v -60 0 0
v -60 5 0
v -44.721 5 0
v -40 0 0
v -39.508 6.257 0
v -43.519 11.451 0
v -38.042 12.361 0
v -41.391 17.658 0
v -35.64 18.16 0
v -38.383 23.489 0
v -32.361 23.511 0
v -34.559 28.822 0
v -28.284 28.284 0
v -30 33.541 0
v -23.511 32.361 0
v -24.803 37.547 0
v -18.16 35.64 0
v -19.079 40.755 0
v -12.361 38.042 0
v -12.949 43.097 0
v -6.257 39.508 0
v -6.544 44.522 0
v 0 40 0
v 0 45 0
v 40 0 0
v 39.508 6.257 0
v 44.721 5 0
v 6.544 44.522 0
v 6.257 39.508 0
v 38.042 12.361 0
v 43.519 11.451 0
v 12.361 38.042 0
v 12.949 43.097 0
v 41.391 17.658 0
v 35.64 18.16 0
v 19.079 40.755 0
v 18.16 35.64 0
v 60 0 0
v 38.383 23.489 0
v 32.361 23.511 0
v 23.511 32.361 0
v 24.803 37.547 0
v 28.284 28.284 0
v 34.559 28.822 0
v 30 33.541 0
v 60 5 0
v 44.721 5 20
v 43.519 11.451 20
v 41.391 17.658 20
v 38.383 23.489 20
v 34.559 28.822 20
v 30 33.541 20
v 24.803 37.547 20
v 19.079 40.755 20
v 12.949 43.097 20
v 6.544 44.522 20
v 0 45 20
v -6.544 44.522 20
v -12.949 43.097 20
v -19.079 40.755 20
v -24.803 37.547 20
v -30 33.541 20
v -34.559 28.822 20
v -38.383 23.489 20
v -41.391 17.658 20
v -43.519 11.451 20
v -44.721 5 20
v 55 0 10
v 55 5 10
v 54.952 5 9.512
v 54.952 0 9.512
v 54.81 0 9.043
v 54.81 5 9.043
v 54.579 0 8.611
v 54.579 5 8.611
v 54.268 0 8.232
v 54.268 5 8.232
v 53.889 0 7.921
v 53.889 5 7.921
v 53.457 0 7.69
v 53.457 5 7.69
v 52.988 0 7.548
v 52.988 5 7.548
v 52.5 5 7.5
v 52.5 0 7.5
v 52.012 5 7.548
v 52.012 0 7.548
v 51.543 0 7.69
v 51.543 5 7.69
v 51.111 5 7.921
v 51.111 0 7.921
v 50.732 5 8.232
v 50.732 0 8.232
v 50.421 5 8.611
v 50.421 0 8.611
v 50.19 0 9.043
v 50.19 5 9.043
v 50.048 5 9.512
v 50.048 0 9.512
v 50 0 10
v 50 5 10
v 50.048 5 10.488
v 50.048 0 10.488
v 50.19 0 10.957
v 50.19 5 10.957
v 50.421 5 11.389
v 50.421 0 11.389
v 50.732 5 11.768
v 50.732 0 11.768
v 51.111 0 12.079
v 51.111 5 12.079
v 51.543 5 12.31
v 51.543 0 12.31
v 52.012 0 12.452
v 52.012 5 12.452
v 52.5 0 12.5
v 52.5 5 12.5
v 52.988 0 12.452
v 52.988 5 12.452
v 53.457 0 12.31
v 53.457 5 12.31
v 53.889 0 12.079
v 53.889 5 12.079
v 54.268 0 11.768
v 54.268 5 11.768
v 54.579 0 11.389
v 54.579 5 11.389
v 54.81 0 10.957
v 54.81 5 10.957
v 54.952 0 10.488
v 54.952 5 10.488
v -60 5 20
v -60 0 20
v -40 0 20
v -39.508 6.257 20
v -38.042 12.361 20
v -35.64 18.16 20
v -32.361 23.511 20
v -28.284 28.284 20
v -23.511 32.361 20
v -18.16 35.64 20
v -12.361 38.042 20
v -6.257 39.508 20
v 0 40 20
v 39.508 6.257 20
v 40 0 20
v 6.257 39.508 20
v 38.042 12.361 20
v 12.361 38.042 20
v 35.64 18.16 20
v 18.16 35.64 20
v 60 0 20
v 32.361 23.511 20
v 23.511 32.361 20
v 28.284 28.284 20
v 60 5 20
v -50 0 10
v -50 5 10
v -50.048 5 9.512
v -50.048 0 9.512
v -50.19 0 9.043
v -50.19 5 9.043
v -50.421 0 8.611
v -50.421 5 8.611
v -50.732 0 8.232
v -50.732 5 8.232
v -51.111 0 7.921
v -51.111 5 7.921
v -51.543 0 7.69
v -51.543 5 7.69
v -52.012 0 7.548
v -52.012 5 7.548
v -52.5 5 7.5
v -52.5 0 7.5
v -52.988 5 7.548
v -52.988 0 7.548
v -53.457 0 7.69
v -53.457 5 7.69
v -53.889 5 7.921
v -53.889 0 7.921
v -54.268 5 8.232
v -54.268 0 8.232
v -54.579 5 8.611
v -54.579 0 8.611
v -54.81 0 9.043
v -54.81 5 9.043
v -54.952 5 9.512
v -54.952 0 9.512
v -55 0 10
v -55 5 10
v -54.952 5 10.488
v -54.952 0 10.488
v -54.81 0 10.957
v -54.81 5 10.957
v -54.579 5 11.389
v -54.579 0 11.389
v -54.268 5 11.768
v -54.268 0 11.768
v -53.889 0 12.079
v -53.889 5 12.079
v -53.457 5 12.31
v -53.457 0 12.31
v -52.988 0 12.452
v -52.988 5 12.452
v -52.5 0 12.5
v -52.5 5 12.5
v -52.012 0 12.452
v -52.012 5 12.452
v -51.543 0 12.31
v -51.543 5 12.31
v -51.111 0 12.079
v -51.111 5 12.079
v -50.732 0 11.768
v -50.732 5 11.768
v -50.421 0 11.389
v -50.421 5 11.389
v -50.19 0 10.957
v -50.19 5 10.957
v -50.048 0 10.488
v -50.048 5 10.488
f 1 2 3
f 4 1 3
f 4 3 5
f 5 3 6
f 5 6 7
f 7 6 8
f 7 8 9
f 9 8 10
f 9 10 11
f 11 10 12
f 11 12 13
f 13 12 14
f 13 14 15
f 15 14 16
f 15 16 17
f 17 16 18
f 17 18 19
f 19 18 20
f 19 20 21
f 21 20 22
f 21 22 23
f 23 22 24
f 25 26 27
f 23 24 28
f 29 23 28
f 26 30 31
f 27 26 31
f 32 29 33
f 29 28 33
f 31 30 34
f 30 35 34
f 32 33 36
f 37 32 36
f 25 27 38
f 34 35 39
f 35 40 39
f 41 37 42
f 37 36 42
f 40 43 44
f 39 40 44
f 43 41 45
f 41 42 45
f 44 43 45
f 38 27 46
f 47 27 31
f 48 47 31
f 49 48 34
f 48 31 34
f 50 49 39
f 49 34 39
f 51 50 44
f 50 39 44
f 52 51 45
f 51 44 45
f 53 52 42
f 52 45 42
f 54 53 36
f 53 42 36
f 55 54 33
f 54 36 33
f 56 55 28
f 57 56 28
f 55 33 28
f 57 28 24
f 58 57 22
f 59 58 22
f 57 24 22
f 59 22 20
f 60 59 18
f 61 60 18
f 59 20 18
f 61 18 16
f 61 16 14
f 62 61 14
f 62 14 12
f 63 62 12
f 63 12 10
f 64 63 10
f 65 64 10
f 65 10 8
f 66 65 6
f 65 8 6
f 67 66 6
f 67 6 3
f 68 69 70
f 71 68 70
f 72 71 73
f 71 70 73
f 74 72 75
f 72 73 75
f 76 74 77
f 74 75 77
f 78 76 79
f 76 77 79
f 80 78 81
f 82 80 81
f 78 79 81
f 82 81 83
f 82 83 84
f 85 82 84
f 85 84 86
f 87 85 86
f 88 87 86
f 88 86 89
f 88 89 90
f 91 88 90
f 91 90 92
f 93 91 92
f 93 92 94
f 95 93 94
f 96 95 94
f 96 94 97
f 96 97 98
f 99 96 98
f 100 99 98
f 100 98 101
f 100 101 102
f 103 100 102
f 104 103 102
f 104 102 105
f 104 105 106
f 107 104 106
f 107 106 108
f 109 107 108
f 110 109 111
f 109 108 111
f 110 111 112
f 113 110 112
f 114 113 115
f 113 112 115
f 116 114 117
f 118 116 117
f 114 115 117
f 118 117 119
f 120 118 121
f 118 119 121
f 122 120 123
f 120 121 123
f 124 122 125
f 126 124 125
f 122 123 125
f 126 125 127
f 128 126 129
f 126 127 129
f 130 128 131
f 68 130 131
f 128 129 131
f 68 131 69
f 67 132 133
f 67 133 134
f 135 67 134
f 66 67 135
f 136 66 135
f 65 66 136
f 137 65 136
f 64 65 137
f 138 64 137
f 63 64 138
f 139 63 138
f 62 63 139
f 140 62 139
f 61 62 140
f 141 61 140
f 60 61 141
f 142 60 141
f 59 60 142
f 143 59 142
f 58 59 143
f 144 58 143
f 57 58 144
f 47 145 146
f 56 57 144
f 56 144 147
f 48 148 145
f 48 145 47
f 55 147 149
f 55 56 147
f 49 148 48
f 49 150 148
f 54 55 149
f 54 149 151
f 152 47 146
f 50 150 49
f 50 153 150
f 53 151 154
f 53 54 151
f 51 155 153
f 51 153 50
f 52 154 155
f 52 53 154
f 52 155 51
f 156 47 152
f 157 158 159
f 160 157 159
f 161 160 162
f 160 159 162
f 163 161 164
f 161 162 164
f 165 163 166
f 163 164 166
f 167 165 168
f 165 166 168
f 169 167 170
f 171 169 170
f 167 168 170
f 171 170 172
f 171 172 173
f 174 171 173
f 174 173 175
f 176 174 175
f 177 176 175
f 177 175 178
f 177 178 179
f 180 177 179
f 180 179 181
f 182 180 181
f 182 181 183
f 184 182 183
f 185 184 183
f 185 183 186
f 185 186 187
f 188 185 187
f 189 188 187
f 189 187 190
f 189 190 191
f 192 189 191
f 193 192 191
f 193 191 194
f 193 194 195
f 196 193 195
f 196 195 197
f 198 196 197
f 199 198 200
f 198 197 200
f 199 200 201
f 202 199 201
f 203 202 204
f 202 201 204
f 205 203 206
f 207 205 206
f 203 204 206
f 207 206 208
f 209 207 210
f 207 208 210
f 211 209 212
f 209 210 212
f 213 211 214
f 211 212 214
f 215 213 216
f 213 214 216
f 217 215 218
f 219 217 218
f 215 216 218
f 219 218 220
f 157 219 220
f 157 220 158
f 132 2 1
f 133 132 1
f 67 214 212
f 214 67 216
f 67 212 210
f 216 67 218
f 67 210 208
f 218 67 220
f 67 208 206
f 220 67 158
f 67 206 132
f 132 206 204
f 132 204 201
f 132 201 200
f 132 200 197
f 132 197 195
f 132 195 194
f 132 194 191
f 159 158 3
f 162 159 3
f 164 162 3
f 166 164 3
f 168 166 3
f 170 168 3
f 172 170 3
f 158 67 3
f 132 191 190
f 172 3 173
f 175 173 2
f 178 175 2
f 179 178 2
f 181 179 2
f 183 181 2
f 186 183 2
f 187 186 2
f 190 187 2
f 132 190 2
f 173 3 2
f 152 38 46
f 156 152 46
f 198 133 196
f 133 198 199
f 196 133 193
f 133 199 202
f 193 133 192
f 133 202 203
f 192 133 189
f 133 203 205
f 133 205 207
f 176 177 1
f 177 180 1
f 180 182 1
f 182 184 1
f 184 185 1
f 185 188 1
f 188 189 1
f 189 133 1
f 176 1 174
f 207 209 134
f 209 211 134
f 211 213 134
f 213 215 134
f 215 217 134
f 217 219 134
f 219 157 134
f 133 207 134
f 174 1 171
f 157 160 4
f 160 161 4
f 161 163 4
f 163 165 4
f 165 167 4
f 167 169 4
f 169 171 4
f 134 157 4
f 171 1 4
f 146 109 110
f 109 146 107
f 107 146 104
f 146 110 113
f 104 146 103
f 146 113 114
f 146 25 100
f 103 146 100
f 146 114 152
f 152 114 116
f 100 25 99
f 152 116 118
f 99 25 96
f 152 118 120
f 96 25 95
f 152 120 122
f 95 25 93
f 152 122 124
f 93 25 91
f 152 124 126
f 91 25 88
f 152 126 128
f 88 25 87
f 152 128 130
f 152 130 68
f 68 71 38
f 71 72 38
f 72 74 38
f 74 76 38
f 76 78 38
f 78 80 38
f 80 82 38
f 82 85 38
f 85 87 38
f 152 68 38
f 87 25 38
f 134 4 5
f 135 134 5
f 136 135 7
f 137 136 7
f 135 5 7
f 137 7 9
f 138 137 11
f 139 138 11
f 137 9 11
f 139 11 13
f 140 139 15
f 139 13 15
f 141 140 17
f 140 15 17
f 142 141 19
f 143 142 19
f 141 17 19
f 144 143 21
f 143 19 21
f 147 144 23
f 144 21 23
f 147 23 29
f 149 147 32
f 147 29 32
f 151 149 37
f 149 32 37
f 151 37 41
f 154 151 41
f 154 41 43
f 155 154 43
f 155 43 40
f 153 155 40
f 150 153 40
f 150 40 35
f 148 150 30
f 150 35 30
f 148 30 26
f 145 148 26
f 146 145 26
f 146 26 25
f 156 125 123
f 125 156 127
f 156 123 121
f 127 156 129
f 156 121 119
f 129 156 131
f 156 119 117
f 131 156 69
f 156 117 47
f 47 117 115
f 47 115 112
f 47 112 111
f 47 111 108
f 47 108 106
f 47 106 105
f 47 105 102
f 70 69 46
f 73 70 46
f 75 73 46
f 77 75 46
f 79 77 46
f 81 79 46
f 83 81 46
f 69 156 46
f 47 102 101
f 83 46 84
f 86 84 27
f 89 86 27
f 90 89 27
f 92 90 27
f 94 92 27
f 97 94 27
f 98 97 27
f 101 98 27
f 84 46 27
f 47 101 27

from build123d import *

# Parameters (mm, degrees)
BOSS_EXTRUDE1_DEPTH = 20
SKETCH3_R           = 2.5
CUT_EXTRUDE2_DEPTH  = 6


with BuildPart() as part:
    # Sketch1 → Boss-Extrude1 (new body)
    with BuildSketch(Plane.XY):
        with BuildLine():
            Line((-45, 0), (-40, 0))
            ThreePointArc((-40, 0), (0, 40), (40, 0))
            Line((40, 0), (45, 0))
            Line((45, 0), (60, 0))
            Line((60, 0), (60, 5))
            Line((60, 5), (44.72135955, 5))
            ThreePointArc((44.72135955, 5), (0, 45), (-44.72135955, 5))
            Line((-44.72135955, 5), (-60, 5))
            Line((-60, 5), (-60, 0))
            Line((-60, 0), (-45, 0))
        make_face()
    extrude(amount=BOSS_EXTRUDE1_DEPTH)

    # Sketch3 → Cut-Extrude2 (cut, through all)
    with BuildSketch(Plane(origin=(0, 5, 0), x_dir=(1, 0, 0), z_dir=(0, 1, 0))):
        with Locations((-52.5, -10)):
            Circle(SKETCH3_R)
        with Locations((52.5, -10)):
            Circle(SKETCH3_R)
    extrude(amount=-CUT_EXTRUDE2_DEPTH, mode=Mode.SUBTRACT)


solid = part.part
